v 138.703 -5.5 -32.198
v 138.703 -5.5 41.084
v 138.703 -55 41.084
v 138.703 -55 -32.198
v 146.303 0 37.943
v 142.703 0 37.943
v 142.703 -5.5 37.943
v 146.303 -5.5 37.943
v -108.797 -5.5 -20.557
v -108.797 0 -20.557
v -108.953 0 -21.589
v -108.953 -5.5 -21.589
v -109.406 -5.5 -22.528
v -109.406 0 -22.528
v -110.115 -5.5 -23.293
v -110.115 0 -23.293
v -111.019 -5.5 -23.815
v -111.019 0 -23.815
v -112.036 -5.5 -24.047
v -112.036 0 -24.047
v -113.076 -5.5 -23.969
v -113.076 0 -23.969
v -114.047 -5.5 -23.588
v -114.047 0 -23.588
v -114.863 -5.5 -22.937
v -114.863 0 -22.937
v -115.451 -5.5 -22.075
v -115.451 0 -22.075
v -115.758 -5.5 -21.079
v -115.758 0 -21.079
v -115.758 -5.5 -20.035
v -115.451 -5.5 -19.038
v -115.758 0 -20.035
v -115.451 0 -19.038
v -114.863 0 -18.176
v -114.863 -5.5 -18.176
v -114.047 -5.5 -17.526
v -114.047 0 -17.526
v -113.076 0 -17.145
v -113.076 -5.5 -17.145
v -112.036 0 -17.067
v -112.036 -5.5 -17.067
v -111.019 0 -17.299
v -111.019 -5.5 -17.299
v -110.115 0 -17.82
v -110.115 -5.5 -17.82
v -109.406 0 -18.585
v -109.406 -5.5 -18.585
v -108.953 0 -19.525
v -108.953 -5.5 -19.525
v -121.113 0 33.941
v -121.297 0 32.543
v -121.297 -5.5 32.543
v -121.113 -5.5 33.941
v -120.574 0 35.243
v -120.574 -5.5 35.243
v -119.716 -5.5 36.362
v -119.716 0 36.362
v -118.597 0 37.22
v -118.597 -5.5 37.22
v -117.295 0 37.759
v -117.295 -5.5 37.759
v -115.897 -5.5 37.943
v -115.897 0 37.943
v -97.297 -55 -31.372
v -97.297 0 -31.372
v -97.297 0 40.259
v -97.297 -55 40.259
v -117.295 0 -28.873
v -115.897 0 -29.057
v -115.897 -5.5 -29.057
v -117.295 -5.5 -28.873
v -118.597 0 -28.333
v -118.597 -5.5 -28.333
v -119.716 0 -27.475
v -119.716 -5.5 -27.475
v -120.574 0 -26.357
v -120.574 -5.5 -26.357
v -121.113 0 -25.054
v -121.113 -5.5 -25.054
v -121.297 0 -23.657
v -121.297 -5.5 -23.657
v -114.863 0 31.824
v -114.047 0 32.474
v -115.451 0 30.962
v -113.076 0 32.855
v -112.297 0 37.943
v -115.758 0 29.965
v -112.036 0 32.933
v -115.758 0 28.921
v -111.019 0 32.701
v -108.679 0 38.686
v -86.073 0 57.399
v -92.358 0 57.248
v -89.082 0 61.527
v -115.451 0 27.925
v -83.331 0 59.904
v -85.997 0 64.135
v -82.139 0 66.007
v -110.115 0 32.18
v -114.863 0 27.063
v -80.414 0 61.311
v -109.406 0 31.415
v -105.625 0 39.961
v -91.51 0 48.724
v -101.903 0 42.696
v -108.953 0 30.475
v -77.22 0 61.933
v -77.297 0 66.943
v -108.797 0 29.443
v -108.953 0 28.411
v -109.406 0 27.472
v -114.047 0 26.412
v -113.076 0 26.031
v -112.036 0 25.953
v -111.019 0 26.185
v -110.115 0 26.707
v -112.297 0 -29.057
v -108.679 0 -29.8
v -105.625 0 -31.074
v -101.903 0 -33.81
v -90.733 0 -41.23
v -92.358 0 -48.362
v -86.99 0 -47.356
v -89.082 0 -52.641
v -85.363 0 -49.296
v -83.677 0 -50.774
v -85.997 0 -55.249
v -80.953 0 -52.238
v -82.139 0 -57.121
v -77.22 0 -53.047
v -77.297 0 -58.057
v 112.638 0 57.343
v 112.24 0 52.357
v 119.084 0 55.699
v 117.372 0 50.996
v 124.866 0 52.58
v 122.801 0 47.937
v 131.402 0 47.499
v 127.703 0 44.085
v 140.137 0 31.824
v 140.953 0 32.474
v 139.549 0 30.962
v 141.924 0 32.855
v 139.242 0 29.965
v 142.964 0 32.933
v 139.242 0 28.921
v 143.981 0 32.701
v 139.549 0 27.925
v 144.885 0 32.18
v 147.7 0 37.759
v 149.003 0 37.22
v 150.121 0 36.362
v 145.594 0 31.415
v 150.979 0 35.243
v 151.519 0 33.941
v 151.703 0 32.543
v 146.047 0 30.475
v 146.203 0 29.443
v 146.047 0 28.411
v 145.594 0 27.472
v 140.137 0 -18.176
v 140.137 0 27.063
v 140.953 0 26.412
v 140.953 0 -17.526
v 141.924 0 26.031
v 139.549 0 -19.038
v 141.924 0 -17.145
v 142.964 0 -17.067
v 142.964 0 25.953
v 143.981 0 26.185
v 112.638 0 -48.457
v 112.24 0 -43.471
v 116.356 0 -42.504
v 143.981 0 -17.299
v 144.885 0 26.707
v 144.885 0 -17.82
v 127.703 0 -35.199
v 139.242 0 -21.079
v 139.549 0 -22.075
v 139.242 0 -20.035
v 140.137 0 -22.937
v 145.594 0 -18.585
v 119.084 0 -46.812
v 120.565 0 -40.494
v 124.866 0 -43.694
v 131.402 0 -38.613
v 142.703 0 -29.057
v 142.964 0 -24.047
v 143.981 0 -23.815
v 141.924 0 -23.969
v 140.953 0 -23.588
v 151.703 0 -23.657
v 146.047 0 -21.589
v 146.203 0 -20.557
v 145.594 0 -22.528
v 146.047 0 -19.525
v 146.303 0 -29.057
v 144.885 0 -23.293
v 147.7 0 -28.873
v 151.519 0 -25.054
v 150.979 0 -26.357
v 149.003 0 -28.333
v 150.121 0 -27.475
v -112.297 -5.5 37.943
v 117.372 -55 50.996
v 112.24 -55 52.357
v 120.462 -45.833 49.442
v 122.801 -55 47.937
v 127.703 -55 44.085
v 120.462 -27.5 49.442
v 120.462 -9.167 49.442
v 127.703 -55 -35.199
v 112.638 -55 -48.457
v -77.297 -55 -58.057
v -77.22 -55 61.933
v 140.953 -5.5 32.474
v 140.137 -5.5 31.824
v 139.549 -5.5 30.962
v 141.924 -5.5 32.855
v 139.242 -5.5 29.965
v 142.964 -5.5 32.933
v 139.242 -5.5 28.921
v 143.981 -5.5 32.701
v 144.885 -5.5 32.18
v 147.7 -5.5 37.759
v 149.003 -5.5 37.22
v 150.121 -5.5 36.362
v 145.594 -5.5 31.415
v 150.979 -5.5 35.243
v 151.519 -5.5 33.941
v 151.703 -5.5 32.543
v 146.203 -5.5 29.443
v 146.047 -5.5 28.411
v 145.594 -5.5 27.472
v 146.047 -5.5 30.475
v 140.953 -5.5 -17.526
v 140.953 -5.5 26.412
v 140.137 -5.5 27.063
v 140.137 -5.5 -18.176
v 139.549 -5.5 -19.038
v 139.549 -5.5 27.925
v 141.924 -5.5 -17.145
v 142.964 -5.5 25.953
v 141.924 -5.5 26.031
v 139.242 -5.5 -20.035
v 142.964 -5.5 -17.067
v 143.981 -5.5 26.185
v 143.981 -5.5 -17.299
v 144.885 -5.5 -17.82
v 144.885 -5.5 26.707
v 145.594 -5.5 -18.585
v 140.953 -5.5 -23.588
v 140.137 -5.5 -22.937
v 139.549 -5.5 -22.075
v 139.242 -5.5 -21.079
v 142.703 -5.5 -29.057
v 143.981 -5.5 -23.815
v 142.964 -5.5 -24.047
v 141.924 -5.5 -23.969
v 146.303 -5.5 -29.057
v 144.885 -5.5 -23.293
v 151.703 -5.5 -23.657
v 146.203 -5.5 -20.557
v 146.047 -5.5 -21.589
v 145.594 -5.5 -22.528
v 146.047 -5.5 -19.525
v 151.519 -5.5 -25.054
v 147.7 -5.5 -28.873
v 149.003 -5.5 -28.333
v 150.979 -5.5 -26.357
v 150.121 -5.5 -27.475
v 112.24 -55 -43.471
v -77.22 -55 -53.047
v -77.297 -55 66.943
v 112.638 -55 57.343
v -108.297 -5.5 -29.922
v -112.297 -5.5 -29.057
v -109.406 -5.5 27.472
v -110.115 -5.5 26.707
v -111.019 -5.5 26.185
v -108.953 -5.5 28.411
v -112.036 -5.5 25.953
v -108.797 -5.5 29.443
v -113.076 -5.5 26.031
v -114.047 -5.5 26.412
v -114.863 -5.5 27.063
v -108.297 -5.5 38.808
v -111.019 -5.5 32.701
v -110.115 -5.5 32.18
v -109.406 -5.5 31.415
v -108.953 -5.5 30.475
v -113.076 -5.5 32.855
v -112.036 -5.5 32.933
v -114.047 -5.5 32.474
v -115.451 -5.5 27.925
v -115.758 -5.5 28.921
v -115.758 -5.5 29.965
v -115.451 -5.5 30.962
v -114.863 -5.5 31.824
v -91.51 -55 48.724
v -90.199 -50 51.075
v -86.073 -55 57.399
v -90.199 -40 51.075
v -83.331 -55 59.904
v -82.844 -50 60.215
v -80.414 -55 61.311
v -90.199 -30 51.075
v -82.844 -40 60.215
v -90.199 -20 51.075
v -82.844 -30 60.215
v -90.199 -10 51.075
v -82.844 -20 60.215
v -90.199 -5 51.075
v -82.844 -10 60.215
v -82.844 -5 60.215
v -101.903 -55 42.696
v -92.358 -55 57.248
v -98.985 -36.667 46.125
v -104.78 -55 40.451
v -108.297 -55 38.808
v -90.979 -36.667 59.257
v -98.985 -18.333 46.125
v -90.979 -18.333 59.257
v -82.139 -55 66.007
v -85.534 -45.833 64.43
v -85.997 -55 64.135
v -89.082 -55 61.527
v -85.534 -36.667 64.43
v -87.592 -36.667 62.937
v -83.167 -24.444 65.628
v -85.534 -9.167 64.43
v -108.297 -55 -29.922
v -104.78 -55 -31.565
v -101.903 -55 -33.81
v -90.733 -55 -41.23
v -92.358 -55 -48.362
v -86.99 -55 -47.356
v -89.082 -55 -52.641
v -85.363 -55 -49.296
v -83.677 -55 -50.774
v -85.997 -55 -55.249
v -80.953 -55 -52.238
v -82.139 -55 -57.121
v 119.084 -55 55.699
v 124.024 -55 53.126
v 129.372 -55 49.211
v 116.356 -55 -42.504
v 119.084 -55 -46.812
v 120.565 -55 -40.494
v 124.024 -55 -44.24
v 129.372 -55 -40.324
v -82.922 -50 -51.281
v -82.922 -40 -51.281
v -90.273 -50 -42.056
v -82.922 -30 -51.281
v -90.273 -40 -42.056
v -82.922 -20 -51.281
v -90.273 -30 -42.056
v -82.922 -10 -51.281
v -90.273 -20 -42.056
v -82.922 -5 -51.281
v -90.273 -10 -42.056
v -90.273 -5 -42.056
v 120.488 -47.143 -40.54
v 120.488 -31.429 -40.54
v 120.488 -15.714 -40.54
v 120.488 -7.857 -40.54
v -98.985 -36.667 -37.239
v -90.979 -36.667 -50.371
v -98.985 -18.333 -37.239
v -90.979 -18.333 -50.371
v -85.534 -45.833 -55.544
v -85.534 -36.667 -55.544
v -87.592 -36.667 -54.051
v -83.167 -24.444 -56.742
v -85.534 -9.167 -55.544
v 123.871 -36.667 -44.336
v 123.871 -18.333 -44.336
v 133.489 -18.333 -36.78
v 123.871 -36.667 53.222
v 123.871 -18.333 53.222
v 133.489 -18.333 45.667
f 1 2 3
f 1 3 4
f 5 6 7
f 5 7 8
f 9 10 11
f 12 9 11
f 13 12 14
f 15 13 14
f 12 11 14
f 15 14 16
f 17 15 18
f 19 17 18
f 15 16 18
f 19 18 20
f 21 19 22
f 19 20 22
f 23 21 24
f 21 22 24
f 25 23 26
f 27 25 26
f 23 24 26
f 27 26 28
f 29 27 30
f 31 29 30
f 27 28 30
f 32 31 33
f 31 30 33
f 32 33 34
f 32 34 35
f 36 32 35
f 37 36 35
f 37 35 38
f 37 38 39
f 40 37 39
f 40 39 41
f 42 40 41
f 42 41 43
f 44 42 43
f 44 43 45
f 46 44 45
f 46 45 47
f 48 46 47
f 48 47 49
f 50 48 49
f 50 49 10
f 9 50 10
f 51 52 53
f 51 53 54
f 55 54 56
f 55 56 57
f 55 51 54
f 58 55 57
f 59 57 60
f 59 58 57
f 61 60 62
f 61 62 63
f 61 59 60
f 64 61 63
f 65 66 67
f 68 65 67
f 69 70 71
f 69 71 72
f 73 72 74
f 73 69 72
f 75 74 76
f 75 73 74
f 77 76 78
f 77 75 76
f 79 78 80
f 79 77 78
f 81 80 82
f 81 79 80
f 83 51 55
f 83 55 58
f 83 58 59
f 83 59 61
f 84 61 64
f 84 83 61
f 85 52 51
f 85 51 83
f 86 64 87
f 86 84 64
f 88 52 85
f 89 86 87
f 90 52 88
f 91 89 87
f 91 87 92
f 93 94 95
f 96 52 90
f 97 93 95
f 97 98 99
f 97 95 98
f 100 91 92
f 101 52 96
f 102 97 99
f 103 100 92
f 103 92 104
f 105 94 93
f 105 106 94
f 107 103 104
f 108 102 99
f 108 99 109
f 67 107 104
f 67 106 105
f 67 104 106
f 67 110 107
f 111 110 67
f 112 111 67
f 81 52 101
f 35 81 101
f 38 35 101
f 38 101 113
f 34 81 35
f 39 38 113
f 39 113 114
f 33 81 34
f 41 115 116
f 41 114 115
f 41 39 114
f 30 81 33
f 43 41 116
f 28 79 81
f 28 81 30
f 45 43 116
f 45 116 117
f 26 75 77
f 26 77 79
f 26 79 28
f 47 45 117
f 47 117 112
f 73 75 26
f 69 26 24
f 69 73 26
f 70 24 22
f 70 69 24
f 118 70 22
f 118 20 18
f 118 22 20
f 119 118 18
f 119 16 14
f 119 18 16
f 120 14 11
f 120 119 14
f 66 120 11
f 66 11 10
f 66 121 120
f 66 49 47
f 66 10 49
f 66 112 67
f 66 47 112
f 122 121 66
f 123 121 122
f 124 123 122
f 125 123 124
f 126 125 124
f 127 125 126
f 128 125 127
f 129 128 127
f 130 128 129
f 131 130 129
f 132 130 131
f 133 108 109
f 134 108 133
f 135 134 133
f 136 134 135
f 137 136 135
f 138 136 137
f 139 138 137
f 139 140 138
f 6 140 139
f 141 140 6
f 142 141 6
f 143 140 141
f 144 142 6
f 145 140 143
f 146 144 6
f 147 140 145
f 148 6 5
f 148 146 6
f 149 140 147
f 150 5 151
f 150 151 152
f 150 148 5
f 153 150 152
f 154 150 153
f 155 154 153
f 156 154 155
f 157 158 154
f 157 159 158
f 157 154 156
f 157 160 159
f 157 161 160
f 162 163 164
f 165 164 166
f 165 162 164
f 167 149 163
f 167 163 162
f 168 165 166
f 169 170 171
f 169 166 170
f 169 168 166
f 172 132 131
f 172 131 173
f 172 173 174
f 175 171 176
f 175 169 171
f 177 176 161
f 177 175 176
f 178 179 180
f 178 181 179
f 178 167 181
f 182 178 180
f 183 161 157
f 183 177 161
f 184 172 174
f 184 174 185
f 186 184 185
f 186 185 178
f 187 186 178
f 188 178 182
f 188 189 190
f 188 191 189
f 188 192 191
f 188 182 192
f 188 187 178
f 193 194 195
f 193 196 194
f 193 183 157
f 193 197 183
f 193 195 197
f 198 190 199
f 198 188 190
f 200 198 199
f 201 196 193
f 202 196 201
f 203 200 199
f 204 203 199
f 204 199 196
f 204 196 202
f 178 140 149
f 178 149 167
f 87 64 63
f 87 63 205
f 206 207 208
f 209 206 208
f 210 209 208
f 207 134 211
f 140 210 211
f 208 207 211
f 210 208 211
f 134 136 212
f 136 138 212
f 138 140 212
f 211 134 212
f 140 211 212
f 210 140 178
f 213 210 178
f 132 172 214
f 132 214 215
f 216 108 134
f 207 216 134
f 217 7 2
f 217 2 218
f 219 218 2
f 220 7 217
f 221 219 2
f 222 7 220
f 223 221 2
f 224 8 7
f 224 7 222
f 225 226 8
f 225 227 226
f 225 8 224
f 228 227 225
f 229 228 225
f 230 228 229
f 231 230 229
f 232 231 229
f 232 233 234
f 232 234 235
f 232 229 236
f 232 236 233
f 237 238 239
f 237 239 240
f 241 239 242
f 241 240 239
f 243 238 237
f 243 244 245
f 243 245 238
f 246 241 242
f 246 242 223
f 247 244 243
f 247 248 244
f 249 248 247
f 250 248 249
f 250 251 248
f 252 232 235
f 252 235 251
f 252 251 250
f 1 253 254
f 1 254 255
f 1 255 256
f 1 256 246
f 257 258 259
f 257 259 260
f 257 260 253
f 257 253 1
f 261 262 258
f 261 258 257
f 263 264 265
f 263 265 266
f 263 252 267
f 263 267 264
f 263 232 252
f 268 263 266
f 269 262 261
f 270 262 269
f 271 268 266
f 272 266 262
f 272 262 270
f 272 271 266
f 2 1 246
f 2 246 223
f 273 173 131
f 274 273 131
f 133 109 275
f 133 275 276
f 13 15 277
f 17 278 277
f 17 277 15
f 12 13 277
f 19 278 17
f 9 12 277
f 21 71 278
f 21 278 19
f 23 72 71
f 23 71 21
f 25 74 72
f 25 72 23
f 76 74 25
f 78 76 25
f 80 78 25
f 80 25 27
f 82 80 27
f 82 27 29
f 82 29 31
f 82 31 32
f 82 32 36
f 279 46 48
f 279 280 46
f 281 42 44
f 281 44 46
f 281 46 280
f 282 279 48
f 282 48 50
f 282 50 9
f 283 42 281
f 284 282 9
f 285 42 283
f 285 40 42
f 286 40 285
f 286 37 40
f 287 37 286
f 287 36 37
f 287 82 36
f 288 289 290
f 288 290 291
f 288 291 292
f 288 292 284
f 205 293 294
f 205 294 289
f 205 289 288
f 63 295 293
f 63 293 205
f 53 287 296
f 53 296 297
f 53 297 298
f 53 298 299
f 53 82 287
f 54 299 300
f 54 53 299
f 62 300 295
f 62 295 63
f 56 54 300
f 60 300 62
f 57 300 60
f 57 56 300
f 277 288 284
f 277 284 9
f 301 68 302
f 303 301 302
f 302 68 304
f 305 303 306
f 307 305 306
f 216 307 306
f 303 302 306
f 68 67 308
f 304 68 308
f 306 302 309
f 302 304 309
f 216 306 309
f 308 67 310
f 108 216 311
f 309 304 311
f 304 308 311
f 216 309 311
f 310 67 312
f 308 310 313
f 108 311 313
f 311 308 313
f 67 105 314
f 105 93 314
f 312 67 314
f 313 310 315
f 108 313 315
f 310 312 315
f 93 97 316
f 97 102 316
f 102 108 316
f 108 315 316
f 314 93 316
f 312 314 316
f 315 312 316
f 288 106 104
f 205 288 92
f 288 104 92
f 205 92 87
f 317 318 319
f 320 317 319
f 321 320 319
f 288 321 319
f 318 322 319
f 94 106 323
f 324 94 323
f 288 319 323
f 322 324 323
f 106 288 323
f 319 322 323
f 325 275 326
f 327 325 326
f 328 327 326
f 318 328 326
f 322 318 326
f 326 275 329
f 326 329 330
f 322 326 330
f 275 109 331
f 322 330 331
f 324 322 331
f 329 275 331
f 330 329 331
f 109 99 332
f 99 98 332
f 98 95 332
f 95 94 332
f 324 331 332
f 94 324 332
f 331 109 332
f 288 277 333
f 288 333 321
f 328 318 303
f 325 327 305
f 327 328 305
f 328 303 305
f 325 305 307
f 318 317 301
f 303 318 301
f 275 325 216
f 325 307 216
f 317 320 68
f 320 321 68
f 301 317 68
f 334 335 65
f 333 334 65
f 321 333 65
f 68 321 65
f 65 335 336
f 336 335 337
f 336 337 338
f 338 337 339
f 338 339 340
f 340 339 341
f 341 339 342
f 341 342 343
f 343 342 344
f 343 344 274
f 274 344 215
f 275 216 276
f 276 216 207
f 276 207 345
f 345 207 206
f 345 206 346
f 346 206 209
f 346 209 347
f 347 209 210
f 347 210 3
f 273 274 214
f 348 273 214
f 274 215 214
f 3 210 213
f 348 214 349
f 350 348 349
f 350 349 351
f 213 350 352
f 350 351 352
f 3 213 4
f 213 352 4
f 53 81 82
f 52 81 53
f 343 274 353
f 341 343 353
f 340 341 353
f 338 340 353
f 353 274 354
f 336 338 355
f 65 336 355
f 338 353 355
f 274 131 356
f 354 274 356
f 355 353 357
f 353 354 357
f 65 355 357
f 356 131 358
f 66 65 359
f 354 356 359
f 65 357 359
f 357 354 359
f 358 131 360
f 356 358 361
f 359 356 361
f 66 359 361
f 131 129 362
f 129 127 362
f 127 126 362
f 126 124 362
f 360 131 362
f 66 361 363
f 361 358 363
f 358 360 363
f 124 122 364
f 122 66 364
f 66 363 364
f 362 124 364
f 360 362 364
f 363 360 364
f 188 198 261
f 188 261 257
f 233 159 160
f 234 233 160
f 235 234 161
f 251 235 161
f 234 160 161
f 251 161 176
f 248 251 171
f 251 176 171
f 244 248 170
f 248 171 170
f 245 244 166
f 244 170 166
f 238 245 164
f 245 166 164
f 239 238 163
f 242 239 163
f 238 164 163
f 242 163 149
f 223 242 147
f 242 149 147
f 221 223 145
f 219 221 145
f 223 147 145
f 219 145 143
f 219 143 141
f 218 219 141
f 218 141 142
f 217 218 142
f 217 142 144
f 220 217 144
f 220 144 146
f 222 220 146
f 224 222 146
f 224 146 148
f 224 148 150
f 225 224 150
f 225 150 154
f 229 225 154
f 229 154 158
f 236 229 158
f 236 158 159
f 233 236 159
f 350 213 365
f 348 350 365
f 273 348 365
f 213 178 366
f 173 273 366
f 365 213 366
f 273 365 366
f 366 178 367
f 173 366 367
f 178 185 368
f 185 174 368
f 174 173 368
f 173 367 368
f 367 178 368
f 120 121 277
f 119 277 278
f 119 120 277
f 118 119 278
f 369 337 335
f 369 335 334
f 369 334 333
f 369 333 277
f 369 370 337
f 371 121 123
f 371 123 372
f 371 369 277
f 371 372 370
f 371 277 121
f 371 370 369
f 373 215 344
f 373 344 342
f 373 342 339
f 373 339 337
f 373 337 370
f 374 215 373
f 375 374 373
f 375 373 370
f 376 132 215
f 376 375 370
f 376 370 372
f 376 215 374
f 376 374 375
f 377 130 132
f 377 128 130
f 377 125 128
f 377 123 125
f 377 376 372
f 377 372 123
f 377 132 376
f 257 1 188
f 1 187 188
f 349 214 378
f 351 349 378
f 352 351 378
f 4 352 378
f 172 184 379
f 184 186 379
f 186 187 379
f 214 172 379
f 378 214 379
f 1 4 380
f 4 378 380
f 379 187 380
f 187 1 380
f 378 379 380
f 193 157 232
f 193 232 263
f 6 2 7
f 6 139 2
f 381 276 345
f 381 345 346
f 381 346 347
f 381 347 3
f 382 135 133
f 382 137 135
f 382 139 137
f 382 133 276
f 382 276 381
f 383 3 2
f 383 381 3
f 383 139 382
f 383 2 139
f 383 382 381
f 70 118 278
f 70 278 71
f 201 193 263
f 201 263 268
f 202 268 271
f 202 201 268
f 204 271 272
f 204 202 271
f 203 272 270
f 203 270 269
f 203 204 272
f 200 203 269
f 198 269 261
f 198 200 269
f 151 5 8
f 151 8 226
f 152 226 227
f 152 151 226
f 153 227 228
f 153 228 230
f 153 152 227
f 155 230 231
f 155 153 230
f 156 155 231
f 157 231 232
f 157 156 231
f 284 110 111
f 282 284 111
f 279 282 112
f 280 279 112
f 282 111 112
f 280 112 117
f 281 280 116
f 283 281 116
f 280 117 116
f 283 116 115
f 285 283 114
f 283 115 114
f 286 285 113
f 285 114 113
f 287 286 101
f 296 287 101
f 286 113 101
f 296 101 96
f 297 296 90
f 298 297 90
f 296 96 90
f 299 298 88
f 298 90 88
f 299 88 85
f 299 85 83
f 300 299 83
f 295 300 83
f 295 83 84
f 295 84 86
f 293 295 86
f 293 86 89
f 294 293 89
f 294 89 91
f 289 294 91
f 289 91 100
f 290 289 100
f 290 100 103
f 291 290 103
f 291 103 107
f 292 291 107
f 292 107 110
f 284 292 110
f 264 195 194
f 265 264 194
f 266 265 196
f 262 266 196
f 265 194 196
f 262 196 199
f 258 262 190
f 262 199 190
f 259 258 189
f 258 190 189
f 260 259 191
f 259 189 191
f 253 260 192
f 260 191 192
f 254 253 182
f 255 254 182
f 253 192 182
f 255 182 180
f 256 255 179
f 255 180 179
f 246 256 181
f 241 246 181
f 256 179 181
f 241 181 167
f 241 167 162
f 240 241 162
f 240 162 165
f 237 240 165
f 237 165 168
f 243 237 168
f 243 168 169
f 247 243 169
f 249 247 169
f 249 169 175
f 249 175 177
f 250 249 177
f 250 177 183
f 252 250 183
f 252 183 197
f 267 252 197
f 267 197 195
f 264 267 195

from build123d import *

# Parameters (mm, degrees)
SKETCH1_R           = 3.5
BOSS_EXTRUDE2_DEPTH = 55
SKETCH7_W           = 68.999652055
SKETCH7_H           = 50.415620377
CUT_EXTRUDE5_DEPTH  = 13
SKETCH19_W          = 74.859412742
SKETCH19_H          = 60.725118028
CUT_EXTRUDE7_DEPTH  = 13
CUT_EXTRUDE9_DEPTH  = 55


with BuildPart() as part:
    # Sketch1 → Boss-Extrude2 (new body)
    with BuildSketch(Plane(origin=(0, 0, 0), x_dir=(1, 0, 0), z_dir=(0, 1, 0))):
        with BuildLine():
            Line((-77.297393365, -66.943127962), (112.637979465, -57.343127962))
            add(Edge.make_bspline(
                [(112.637979465, -57.343127962), (125.082628436, -56.027724614), (133.287763268, -44.662014668), (142.702606635, -37.943127962)],
                knots=[0, 0, 0, 0, 1, 1, 1, 1], degree=3))
            Line((142.702606635, -37.943127962), (146.202606635, -37.943127962))
            Line((146.202606635, -37.943127962), (146.302606635, -37.943127962))
            ThreePointArc((146.302606635, -37.943127962), (150.120983253, -36.36150458), (151.702606635, -32.543127962))
            Line((151.702606635, -32.543127962), (151.702606635, 23.656872038))
            ThreePointArc((151.702606635, 23.656872038), (150.120983253, 27.475248656), (146.302606635, 29.056872038))
            Line((146.302606635, 29.056872038), (146.202606635, 29.056872038))
            Line((146.202606635, 29.056872038), (142.702606635, 29.056872038))
            add(Edge.make_bspline(
                [(112.637979465, 48.456872038), (125.082628436, 47.14146869), (133.287763268, 35.775758744), (142.702606635, 29.056872038)],
                knots=[0, 0, 0, 0, 1, 1, 1, 1], degree=3))
            Line((112.637979465, 48.456872038), (-77.297393365, 58.056872038))
            add(Edge.make_bspline(
                [(-77.297393365, 58.056872038), (-97.47829568, 56.558543187), (-92.669908534, 31.299380259), (-112.297393365, 29.056872038)],
                knots=[0, 0, 0, 0, 1, 1, 1, 1], degree=3))
            Line((-112.297393365, 29.056872038), (-115.797393365, 29.056872038))
            Line((-115.797393365, 29.056872038), (-115.897393365, 29.056872038))
            ThreePointArc((-115.897393365, 29.056872038), (-119.715769983, 27.475248656), (-121.297393365, 23.656872038))
            Line((-121.297393365, 23.656872038), (-121.297393365, -32.543127962))
            ThreePointArc((-121.297393365, -32.543127962), (-119.715769983, -36.36150458), (-115.897393365, -37.943127962))
            Line((-115.897393365, -37.943127962), (-115.797393365, -37.943127962))
            Line((-115.797393365, -37.943127962), (-112.297393365, -37.943127962))
            add(Edge.make_bspline(
                [(-77.297393365, -66.943127962), (-97.47829568, -65.444799111), (-92.669908534, -40.185636183), (-112.297393365, -37.943127962)],
                knots=[0, 0, 0, 0, 1, 1, 1, 1], degree=3))
        make_face()
        with Locations((-112.297393365, 20.556872038)):
            Circle(SKETCH1_R, mode=Mode.SUBTRACT)
        with Locations((-112.297393365, -29.443127962)):
            Circle(SKETCH1_R, mode=Mode.SUBTRACT)
        with Locations((142.702606635, -29.443127962)):
            Circle(SKETCH1_R, mode=Mode.SUBTRACT)
        with Locations((142.702606635, 20.556872038)):
            Circle(SKETCH1_R, mode=Mode.SUBTRACT)
    extrude(amount=-BOSS_EXTRUDE2_DEPTH)

    # Sketch7 → Cut-Extrude5 (cut)
    with BuildSketch(Plane.ZY.offset(121.297393365)):
        with Locations((4.333112833, -30.707810189)):
            Rectangle(SKETCH7_W, SKETCH7_H)
    extrude(amount=-CUT_EXTRUDE5_DEPTH, mode=Mode.SUBTRACT)

    # Sketch19 → Cut-Extrude7 (cut)
    with BuildSketch(Plane(origin=(151.702606635, 0, 0), x_dir=(0, 0, -1), z_dir=(1, 0, 0))):
        with Locations((-5.097493458, -35.862559014)):
            Rectangle(SKETCH19_W, SKETCH19_H)
    extrude(amount=-CUT_EXTRUDE7_DEPTH, mode=Mode.SUBTRACT)

    # Sketch24 → Cut-Extrude9 (cut)
    with BuildSketch(Plane(origin=(0, 0, 0), x_dir=(1, 0, 0), z_dir=(0, 1, 0))):
        with BuildLine():
            Line((-97.297393365, 31.372357528), (-97.297393365, -40.258643174))
            add(Edge.make_bspline(
                [(-97.297393365, -40.258643174), (-97.055392699, -40.522543308), (-96.818465561, -40.791519395), (-95.29604309, -42.586141239), (-94.180102109, -44.221795649), (-92.114981147, -47.600331907), (-91.167558943, -49.344344007), (-89.714260063, -51.939679671), (-89.224013692, -52.801383116), (-88.197386212, -54.493312492), (-87.661405753, -55.323638026), (-86.787164869, -56.520642624), (-86.483908233, -56.911472942), (-85.845311529, -57.670997258), (-85.510678135, -58.038515471), (-84.461423347, -59.080983609), (-83.697062972, -59.699960103), (-82.417122679, -60.472101656), (-81.975749173, -60.698816325), (-81.073807536, -61.09027214), (-80.611895531, -61.255932259), (-79.196960523, -61.672670039), (-78.210701758, -61.84358461), (-77.219838786, -61.93282554)],
                knots=[0.352672192, 0.352672192, 0.352672192, 0.352672192, 0.375, 0.375, 0.5, 0.5, 0.625, 0.625, 0.6875, 0.6875, 0.75, 0.75, 0.78125, 0.78125, 0.8125, 0.8125, 0.875, 0.875, 0.90625, 0.90625, 0.9375, 0.9375, 1, 1, 1, 1], degree=3))
            Line((-77.219838786, -61.93282554), (112.240105599, -52.356855361))
            add(Edge.make_bspline(
                [(112.240105599, -52.356855361), (113.717382254, -52.189730891), (115.132971643, -51.8376863), (117.182437857, -51.088035578), (117.853343768, -50.801431656), (119.174145437, -50.165241611), (119.826422425, -49.814165646), (121.732436005, -48.696872923), (122.940710016, -47.866553193), (125.285242411, -46.107289747), (126.421126606, -45.177833586), (127.59402171, -44.178301992), (127.648334729, -44.131926563), (127.702606635, -44.085499704)],
                knots=[0, 0, 0, 0, 0.125, 0.125, 0.1875, 0.1875, 0.25, 0.25, 0.375, 0.375, 0.5, 0.5, 0.506074438, 0.506074438, 0.506074438, 0.506074438], degree=3))
            Line((127.702606635, -44.085499704), (127.702606635, 35.199241787))
            add(Edge.make_bspline(
                [(127.702606635, 35.199241787), (127.656893723, 35.238347374), (126.494699106, 36.231003566), (125.312312668, 37.199657877), (123.548827323, 38.524500877), (122.950515573, 38.954402998), (121.735559113, 39.776761834), (121.118108697, 40.169868377), (119.227839741, 41.28046867), (117.917675896, 41.930280463), (115.836701988, 42.695260765), (115.130607863, 42.912098814), (113.700996756, 43.257880714), (112.975983658, 43.387349472), (112.240105599, 43.470599437)],
                knots=[0.494878569, 0.494878569, 0.494878569, 0.494878569, 0.5, 0.625, 0.625, 0.6875, 0.6875, 0.75, 0.75, 0.875, 0.875, 0.9375, 0.9375, 1, 1, 1, 1], degree=3))
            Line((112.240105599, 43.470599437), (-77.219838786, 53.046569616))
            add(Edge.make_bspline(
                [(-77.219838786, 53.046569616), (-78.226254375, 52.955927957), (-79.213157443, 52.784359124), (-80.65236022, 52.356330798), (-81.126202061, 52.184487982), (-82.053330615, 51.775193987), (-82.497083796, 51.5419399), (-83.346280845, 51.020113337), (-83.751740407, 50.731563524), (-84.52795848, 50.104355813), (-84.899500865, 49.764992502), (-85.964937473, 48.68741183), (-86.589708432, 47.913990928), (-87.747790314, 46.308292885), (-88.280321037, 45.475513671), (-89.301365793, 43.781629681), (-89.789527485, 42.920298168), (-91.239394158, 40.326896414), (-92.188900691, 38.584245442), (-94.255960588, 35.221000735), (-95.371079537, 33.60184943), (-96.859865551, 31.858322069), (-97.076237995, 31.613508704), (-97.297393365, 31.372357528)],
                knots=[0, 0, 0, 0, 0.0625, 0.0625, 0.09375, 0.09375, 0.125, 0.125, 0.15625, 0.15625, 0.1875, 0.1875, 0.25, 0.25, 0.3125, 0.3125, 0.375, 0.375, 0.5, 0.5, 0.625, 0.625, 0.645748558, 0.645748558, 0.645748558, 0.645748558], degree=3))
        make_face()
    extrude(amount=-CUT_EXTRUDE9_DEPTH, mode=Mode.SUBTRACT)


solid = part.part
